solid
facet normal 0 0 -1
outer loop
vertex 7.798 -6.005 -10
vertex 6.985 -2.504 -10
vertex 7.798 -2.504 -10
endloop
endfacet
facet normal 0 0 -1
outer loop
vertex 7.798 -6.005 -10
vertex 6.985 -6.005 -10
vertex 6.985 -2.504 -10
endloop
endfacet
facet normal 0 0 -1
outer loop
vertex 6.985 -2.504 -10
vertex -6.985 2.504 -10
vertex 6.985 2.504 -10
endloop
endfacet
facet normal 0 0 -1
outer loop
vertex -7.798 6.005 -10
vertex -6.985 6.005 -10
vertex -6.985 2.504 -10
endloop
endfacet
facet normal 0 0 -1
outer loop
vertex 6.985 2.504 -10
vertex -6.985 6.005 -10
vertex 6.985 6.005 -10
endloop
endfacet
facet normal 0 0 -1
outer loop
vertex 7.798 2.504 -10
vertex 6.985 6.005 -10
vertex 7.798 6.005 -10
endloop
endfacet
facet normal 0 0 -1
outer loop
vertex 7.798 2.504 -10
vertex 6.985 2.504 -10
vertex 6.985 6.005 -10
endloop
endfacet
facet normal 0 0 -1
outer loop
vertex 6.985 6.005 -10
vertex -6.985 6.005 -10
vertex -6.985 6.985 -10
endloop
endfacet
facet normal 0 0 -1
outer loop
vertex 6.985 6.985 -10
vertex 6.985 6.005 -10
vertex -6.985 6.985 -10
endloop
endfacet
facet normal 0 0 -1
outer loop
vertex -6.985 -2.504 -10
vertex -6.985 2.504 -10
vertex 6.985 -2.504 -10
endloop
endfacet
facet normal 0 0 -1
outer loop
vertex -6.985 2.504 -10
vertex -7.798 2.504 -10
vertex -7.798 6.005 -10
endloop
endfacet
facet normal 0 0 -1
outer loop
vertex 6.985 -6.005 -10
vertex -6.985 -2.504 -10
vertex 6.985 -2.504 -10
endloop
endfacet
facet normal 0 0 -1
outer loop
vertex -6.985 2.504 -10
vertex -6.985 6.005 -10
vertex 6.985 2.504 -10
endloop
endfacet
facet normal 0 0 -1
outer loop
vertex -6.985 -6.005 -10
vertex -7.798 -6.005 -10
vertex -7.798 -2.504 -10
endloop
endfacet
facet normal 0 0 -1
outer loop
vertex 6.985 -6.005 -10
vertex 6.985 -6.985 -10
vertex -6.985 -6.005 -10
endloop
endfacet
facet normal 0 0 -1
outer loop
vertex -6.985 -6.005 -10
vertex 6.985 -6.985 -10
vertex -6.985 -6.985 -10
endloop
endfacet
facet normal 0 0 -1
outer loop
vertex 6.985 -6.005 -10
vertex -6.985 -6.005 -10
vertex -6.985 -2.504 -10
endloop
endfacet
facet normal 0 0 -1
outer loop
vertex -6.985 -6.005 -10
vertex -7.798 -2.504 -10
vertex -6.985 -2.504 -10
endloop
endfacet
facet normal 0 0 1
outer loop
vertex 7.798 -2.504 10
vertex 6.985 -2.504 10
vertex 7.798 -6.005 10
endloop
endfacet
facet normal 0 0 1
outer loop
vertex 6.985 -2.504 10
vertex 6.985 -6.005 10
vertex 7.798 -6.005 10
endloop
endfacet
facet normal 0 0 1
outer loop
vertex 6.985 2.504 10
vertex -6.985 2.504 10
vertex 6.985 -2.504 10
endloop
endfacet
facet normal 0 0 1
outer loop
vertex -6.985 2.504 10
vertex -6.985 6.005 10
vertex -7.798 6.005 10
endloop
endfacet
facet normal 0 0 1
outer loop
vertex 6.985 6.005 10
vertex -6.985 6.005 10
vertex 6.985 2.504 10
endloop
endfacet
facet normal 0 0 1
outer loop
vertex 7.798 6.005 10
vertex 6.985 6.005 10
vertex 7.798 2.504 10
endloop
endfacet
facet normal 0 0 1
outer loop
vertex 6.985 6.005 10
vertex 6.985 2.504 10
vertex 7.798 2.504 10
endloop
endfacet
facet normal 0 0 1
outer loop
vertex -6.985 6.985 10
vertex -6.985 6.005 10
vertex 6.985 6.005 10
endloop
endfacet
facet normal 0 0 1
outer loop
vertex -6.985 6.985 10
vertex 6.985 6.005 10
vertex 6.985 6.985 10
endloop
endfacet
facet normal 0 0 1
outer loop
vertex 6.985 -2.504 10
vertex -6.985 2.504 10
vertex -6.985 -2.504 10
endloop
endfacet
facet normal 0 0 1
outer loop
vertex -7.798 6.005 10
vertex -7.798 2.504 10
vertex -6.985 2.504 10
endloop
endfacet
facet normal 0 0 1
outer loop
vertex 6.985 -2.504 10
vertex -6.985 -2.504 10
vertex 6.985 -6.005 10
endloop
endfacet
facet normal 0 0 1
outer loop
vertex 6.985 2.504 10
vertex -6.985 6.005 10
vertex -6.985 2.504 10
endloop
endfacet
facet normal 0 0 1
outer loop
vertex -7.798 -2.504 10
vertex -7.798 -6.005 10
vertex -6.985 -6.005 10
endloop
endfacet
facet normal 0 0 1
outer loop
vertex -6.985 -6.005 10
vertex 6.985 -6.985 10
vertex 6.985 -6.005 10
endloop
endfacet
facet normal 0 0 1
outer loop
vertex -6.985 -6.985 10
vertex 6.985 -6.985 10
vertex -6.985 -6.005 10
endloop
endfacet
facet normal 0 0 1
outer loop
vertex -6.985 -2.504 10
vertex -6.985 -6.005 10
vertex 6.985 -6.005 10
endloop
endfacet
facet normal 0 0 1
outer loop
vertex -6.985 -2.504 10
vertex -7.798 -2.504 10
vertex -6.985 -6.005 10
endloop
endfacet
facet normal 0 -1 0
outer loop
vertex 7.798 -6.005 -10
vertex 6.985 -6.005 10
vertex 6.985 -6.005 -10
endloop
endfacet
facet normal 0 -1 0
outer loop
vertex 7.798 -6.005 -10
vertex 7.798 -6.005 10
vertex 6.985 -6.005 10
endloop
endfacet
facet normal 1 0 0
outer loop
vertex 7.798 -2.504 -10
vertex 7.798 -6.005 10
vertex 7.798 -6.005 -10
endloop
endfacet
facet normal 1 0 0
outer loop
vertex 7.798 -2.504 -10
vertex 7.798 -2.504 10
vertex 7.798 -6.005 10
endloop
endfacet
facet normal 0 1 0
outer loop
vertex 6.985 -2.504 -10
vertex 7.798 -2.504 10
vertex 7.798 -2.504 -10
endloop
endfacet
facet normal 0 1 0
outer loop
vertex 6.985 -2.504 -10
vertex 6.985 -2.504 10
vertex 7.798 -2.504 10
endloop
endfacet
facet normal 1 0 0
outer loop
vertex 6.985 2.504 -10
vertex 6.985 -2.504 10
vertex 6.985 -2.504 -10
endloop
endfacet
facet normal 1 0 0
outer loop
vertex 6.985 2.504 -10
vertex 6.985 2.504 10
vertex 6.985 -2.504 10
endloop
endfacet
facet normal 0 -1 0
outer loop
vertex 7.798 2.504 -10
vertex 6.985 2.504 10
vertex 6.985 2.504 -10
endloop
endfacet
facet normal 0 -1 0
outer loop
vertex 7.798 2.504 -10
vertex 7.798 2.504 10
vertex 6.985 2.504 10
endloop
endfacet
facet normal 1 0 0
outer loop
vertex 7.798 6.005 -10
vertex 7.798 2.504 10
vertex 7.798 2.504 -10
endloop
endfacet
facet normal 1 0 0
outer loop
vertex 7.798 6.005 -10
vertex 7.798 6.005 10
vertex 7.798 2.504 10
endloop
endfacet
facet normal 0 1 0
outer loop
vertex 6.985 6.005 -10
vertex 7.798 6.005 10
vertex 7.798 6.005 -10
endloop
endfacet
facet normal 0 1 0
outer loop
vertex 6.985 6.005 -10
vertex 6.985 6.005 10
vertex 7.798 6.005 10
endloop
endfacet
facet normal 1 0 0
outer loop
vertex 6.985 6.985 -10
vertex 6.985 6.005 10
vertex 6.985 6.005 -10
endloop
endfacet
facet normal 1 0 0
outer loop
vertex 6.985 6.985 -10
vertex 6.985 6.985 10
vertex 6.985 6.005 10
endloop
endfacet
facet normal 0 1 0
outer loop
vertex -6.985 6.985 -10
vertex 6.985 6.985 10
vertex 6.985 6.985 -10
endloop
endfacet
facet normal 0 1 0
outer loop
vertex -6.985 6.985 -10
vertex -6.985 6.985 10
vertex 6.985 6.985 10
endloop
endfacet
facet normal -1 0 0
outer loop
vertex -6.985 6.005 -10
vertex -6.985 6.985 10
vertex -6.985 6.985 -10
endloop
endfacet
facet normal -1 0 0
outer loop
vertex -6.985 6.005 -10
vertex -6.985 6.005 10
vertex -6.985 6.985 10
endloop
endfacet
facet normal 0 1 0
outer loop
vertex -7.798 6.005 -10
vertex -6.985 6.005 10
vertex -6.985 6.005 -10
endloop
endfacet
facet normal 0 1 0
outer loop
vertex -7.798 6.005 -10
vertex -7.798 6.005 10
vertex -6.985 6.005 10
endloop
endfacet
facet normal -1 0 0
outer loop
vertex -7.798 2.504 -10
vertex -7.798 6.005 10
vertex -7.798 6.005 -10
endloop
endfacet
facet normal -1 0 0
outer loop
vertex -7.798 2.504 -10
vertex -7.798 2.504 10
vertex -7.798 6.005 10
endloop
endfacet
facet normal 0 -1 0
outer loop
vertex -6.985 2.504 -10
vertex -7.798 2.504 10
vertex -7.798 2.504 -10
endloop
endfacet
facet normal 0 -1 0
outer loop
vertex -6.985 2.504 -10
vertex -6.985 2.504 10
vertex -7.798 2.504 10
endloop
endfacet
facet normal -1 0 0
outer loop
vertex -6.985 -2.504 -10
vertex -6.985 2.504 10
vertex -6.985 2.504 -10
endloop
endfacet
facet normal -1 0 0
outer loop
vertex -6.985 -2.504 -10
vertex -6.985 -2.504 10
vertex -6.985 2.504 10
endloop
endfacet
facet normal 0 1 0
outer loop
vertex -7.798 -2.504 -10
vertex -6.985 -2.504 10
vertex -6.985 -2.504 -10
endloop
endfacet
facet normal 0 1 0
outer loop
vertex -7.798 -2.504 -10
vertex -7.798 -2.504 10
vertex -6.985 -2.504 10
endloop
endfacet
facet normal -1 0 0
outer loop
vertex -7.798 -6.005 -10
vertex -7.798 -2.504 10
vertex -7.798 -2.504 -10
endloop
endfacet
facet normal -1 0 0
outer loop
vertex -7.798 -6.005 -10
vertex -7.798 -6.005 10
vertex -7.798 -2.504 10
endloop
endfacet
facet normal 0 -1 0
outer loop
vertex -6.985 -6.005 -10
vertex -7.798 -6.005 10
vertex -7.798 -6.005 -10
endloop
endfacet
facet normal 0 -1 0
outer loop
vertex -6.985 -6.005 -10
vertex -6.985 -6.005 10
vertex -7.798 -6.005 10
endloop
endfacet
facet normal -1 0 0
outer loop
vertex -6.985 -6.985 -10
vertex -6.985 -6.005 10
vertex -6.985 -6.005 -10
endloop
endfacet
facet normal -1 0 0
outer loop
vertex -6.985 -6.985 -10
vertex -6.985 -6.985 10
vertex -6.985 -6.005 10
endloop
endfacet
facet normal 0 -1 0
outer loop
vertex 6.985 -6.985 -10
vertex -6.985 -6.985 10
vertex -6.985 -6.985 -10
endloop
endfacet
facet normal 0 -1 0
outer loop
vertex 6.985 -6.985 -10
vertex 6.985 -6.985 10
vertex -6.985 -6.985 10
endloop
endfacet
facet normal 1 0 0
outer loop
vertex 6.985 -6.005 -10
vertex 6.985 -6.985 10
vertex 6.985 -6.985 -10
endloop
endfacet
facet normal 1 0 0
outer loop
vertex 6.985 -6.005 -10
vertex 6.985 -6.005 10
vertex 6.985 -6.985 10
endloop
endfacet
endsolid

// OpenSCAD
$fn = 2000;

/// Creates a switch hole cutout.
module switch_hole(position, height = 20){
  // https://github.com/technomancy/atreus/blob/master/case/openscad/atreus_case.scad
  /* Cherry MX switch hole with the center at `position`. Sizes come
      from the ErgoDox design. */  

  hole_size = 13.97;
  notch_width = 3.5001;
  notch_offset = 4.2545;
  notch_depth = 0.8128;

  // Convert from 2d to 

  linear_extrude(height = height, center = true){
    square([hole_size, hole_size], center = true);

    translate([0, notch_offset]){
      square([hole_size + 2 * notch_depth, notch_width], center = true);
    }
    translate([0, -notch_offset]){
      square([hole_size + 2 * notch_depth, notch_width], center = true);
    }
  }
};

module switch_cutout(position){
  switch_cutout_width = 20;
  switch_cutout_height = 5;

  w = switch_cutout_width;
  h = switch_cutout_height;
  translate(position){
    difference(){
      cube([w, w, h], true);
      switch_hole([0], height = 200);
    }
  }
}

module switch_with_border(){
  switch_cutout([0, 0, 2.5]);
  difference(){
    translate([0, 0, 5]){
      cube([30, 30, 10], true);
    }
    translate([0, 0, 5]){
      cube([20, 20, 10], true);
    }
  }
}

switch_hole([0, 0, 0]);
